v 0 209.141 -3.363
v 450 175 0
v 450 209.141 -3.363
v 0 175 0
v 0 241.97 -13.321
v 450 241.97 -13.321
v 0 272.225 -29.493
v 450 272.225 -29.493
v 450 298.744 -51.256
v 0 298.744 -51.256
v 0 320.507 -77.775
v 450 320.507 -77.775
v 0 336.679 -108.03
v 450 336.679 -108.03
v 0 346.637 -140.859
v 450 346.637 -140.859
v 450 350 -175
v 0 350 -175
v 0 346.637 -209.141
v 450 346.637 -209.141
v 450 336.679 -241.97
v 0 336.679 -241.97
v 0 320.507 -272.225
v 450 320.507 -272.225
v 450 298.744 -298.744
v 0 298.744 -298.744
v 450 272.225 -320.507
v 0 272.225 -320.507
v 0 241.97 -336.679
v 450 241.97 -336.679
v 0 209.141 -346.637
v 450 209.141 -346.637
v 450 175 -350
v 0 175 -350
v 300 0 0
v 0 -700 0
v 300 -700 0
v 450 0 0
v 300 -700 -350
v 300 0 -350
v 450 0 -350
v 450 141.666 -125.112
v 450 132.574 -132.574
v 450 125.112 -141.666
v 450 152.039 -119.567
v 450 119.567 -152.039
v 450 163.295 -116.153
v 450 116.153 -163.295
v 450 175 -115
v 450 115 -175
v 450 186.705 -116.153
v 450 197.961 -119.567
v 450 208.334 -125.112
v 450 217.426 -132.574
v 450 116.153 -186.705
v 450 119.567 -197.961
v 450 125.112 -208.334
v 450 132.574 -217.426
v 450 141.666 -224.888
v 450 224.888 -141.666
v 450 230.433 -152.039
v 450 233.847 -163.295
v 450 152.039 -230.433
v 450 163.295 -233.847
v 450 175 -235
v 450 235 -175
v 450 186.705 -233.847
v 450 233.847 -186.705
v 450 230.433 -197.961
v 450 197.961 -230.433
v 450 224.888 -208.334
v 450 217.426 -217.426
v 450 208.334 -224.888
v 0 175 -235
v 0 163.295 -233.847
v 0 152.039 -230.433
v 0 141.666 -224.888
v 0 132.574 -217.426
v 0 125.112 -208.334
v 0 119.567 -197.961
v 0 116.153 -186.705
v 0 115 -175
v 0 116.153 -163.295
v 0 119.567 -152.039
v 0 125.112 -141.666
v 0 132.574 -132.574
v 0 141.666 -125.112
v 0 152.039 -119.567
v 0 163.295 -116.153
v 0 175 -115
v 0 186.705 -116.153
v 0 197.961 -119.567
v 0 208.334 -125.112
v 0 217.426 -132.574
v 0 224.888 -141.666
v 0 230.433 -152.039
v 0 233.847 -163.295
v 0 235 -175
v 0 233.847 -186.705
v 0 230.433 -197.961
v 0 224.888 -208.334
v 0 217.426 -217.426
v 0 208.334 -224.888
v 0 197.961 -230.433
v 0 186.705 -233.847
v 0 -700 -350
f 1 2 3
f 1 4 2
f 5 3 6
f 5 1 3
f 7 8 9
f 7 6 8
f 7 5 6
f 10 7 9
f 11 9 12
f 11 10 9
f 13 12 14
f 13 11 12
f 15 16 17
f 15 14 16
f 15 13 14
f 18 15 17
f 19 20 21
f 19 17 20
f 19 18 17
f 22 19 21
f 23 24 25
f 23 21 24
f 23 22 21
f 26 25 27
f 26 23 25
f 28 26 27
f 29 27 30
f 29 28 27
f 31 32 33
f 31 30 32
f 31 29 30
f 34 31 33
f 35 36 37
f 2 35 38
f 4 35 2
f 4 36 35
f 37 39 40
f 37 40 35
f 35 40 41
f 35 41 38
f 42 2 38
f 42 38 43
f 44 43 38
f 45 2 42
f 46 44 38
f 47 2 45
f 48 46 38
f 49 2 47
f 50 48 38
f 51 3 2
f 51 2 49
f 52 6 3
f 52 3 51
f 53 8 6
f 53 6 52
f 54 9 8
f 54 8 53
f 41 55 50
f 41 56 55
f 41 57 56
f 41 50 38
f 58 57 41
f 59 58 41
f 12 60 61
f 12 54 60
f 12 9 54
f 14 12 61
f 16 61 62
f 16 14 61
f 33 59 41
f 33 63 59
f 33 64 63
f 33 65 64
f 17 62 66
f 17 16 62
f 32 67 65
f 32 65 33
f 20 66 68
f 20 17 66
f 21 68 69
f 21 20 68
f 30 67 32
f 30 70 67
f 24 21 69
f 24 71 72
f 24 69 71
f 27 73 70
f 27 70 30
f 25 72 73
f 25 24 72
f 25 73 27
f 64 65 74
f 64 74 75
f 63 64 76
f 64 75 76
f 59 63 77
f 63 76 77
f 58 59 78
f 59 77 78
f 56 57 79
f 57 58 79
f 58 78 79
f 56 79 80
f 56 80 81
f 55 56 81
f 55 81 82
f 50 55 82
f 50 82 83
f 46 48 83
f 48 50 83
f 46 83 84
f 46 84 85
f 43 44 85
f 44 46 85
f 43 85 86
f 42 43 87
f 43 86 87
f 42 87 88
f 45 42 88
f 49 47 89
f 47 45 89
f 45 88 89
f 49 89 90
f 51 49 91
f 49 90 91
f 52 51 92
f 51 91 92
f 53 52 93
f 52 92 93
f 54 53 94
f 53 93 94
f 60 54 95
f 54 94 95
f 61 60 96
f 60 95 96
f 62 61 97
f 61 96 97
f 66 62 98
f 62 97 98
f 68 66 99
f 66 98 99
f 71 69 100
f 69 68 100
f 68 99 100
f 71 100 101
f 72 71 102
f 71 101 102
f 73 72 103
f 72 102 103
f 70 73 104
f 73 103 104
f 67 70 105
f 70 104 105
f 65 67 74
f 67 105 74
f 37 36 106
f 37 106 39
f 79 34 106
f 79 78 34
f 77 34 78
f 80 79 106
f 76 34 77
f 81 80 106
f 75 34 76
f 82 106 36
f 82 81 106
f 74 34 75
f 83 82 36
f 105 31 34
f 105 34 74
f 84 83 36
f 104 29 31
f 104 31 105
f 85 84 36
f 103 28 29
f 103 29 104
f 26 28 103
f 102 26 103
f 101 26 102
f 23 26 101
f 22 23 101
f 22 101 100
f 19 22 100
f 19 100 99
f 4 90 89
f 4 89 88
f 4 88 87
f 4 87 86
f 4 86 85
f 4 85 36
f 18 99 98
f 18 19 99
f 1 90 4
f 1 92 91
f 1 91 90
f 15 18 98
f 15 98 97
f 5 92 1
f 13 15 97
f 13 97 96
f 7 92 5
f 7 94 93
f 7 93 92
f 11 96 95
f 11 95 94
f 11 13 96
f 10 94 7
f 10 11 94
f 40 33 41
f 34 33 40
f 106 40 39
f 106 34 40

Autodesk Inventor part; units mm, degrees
ref_plane "YZ Plane" through (0, 0, 0) normal (1, 0, 0) x (0, 1, 0)
ref_plane "XZ Plane" through (0, 0, 0) normal (0, 1, 0) x (-1, 0, 0)
ref_plane "XY Plane" through (0, 0, 0) normal (0, 0, 1) x (1, 0, 0)
sketch "Sketch10" plane through (0, 0, 0) normal (1, 0, 0) x (0, 1, 0)
  line L0 (0, 0) -> (175, 0)
  line L1 (350, -175) -> (350, -175)
  line L2 (175, -350) -> (0, -350)
  line L3 (0, -350) -> (0, 0)
  arc A0 (350, -175) -> (175, 0) centre (175, -175) ccw
  arc A1 (175, -350) -> (350, -175) centre (175, -175) ccw
  point P0 (350, -350)
  point P1 (350, 0)
  dimension "d73" = 350
  dimension "d74" = 350
  dimension "d76" = 175
extrude "Extrusion19" add sketch "Sketch10" along normal blind 300
sketch "Sketch11" plane through (300, 0, 0) normal (1, 0, 0) x (0, 0, -1)
  arc A0 (350, 175) -> (0, 175) centre (175, 175) ccw projected
  circle A1 centre (175, 175) radius 60
  point P0 (0, 0)
  dimension "d79" = 120
extrude "Extrusion20" cut sketch "Sketch11" against normal blind 300
sketch "Sketch12" plane through (0, 0, -350) normal (0, -1, 0) x (1, 0, 0)
  line L0 (300, 0) -> (300, 350) projected
  line L1 (0, 350) -> (300, 350)
  line L2 (300, 350) -> (300, 0)
  line L3 (300, 0) -> (0, 0)
  line L4 (0, 0) -> (0, 350)
extrude "Extrusion21" add sketch "Sketch12" along normal blind 700
sketch "Sketch13" plane through (300, 0, 0) normal (1, 0, 0) x (0, 0, -1)
  circle A0 centre (175, 175) radius 60 projected
  arc A1 (350, 175) -> (0, 175) centre (175, 175) ccw projected
  arc A2 (350, 175) -> (0, 175) centre (175, 175) ccw
  line L0 (350, 175) -> (350, 0)
  line L1 (350, 0) -> (0, 0)
  line L2 (0, 0) -> (0, 175)
  circle A3 centre (175, 175) radius 60
extrude "Extrusion22" add sketch "Sketch13" along normal blind 150
properties part number "Molde" material "Aluminum 6061"
